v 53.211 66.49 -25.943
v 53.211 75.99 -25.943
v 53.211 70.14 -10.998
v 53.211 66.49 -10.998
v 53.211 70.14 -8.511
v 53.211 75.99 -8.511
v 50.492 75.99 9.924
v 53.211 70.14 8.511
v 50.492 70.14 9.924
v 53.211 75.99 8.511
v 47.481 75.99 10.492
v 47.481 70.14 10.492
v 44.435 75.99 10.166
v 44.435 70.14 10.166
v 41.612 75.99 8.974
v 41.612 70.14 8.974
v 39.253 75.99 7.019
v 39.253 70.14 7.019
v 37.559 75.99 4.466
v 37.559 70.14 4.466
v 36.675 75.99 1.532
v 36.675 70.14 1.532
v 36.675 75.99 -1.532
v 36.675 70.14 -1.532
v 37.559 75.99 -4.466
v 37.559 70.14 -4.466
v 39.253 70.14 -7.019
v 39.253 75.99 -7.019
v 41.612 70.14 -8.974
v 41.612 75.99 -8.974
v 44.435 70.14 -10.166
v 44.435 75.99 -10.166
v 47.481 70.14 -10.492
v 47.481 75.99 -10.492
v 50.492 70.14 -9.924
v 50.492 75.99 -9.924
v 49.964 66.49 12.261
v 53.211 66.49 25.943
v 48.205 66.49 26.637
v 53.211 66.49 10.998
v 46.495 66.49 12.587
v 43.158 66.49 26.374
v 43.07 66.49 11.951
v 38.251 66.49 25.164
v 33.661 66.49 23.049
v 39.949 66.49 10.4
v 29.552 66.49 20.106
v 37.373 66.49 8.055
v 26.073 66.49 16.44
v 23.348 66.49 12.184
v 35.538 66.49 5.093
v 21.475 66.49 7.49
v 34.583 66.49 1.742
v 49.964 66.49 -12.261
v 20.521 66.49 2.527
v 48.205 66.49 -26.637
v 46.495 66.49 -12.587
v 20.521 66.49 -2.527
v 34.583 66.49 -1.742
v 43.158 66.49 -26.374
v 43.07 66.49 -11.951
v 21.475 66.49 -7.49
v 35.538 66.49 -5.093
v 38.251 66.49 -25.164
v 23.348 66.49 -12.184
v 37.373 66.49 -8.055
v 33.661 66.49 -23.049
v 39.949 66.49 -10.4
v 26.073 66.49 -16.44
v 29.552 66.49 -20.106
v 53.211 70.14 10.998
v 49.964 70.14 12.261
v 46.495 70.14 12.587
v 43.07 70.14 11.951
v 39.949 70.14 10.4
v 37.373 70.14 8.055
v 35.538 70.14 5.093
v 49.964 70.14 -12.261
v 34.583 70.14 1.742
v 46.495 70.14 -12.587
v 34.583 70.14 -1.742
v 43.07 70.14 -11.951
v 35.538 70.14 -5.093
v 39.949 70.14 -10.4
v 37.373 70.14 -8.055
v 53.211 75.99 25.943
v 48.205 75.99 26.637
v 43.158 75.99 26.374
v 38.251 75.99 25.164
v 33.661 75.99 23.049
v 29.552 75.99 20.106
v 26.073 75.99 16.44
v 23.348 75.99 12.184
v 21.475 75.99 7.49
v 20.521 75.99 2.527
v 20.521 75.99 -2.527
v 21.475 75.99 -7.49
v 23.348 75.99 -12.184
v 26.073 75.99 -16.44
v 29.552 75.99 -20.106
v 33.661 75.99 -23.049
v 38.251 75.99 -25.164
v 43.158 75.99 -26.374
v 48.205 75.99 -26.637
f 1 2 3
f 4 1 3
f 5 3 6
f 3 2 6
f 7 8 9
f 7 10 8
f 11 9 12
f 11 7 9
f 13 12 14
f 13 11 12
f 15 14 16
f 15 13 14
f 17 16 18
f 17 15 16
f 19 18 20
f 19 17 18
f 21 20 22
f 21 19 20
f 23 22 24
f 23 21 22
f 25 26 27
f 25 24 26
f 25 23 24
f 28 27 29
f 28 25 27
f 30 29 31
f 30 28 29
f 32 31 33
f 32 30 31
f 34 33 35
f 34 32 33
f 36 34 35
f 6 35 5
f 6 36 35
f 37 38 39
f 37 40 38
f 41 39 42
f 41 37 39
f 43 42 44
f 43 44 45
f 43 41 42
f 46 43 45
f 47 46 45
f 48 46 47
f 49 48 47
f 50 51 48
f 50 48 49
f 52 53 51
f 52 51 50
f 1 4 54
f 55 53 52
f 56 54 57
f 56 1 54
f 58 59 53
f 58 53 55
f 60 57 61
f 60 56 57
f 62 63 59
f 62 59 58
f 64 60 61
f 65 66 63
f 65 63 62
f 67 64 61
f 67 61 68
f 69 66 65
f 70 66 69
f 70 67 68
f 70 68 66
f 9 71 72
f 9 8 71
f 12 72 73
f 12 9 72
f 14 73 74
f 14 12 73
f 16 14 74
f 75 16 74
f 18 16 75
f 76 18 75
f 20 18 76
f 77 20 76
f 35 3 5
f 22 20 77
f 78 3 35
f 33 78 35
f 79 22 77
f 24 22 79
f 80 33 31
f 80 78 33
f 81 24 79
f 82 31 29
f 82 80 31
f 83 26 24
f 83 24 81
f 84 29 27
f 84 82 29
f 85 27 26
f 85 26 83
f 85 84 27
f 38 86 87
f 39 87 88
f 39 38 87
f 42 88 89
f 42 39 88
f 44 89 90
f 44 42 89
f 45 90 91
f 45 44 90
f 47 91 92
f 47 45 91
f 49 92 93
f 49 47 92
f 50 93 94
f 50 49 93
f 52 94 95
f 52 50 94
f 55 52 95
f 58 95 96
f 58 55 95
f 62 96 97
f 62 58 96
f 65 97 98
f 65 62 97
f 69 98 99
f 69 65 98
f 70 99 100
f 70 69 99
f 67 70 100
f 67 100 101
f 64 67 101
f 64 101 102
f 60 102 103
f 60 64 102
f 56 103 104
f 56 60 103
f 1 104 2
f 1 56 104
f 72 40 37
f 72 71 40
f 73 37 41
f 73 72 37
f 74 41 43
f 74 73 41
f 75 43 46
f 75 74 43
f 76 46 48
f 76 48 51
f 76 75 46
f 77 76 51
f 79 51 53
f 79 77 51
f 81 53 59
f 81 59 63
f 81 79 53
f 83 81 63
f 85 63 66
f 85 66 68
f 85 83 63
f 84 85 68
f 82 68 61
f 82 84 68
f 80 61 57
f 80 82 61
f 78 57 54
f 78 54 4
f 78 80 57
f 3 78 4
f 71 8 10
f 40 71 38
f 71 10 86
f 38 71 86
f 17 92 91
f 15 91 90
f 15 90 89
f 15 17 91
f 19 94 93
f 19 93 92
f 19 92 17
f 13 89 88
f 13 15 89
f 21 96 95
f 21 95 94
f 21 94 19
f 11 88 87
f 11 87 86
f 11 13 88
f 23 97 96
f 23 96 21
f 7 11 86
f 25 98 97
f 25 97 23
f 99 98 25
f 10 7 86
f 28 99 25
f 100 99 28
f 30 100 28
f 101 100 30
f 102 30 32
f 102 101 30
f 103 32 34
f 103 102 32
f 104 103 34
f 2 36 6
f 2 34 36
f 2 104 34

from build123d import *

# Parameters (mm, degrees)
F6_DEPTH = 9.501


# Not quite as in the source:
# - a feature of the source that left no trace in its solid (it failed there, or was rolled back) is left out
# - the program builds the solid bodies; features that only make, move or delete a surface that nothing else refers to are left out


with BuildPart() as f4:
    # F0 (on Top) → F4 (revolve)
    with BuildSketch(Plane.XY):
        Polygon((34.4624469289, 70.1398981537), (36.5624469289, 70.1398981537), (36.5624469289, 75.9898981537), (20.4008240253, 75.9898981537), (20.4008240253, 66.4898981537), (28.4008240253, 66.4898981537), (34.4624469289, 66.4898981537), align=None)
    revolve(axis=Axis((47.0624469289, 47.4898981537, 0), (0, -1, 0)))

    # F5 (on face) → F6 (cut, through all)
    with BuildSketch(Plane(origin=(0, 75.9898981537, 0), x_dir=(-1, 0, 0), z_dir=(0, 1, 0))):
        with BuildLine():
            Line((-53.2110722647, 8.511427993), (-53.2110722647, 25.9429478343))
            ThreePointArc((-53.2110722647, 25.9429478343), (-73.7240698325, 0), (-53.2110722647, -25.9429478343))
            Line((-53.2110722647, -25.9429478343), (-53.2110722647, -8.511427993))
            ThreePointArc((-53.2110722647, -8.511427993), (-57.5624469289, 0), (-53.2110722647, 8.511427993))
        make_face()
    extrude(amount=-F6_DEPTH, mode=Mode.SUBTRACT)


solid = f4.part
